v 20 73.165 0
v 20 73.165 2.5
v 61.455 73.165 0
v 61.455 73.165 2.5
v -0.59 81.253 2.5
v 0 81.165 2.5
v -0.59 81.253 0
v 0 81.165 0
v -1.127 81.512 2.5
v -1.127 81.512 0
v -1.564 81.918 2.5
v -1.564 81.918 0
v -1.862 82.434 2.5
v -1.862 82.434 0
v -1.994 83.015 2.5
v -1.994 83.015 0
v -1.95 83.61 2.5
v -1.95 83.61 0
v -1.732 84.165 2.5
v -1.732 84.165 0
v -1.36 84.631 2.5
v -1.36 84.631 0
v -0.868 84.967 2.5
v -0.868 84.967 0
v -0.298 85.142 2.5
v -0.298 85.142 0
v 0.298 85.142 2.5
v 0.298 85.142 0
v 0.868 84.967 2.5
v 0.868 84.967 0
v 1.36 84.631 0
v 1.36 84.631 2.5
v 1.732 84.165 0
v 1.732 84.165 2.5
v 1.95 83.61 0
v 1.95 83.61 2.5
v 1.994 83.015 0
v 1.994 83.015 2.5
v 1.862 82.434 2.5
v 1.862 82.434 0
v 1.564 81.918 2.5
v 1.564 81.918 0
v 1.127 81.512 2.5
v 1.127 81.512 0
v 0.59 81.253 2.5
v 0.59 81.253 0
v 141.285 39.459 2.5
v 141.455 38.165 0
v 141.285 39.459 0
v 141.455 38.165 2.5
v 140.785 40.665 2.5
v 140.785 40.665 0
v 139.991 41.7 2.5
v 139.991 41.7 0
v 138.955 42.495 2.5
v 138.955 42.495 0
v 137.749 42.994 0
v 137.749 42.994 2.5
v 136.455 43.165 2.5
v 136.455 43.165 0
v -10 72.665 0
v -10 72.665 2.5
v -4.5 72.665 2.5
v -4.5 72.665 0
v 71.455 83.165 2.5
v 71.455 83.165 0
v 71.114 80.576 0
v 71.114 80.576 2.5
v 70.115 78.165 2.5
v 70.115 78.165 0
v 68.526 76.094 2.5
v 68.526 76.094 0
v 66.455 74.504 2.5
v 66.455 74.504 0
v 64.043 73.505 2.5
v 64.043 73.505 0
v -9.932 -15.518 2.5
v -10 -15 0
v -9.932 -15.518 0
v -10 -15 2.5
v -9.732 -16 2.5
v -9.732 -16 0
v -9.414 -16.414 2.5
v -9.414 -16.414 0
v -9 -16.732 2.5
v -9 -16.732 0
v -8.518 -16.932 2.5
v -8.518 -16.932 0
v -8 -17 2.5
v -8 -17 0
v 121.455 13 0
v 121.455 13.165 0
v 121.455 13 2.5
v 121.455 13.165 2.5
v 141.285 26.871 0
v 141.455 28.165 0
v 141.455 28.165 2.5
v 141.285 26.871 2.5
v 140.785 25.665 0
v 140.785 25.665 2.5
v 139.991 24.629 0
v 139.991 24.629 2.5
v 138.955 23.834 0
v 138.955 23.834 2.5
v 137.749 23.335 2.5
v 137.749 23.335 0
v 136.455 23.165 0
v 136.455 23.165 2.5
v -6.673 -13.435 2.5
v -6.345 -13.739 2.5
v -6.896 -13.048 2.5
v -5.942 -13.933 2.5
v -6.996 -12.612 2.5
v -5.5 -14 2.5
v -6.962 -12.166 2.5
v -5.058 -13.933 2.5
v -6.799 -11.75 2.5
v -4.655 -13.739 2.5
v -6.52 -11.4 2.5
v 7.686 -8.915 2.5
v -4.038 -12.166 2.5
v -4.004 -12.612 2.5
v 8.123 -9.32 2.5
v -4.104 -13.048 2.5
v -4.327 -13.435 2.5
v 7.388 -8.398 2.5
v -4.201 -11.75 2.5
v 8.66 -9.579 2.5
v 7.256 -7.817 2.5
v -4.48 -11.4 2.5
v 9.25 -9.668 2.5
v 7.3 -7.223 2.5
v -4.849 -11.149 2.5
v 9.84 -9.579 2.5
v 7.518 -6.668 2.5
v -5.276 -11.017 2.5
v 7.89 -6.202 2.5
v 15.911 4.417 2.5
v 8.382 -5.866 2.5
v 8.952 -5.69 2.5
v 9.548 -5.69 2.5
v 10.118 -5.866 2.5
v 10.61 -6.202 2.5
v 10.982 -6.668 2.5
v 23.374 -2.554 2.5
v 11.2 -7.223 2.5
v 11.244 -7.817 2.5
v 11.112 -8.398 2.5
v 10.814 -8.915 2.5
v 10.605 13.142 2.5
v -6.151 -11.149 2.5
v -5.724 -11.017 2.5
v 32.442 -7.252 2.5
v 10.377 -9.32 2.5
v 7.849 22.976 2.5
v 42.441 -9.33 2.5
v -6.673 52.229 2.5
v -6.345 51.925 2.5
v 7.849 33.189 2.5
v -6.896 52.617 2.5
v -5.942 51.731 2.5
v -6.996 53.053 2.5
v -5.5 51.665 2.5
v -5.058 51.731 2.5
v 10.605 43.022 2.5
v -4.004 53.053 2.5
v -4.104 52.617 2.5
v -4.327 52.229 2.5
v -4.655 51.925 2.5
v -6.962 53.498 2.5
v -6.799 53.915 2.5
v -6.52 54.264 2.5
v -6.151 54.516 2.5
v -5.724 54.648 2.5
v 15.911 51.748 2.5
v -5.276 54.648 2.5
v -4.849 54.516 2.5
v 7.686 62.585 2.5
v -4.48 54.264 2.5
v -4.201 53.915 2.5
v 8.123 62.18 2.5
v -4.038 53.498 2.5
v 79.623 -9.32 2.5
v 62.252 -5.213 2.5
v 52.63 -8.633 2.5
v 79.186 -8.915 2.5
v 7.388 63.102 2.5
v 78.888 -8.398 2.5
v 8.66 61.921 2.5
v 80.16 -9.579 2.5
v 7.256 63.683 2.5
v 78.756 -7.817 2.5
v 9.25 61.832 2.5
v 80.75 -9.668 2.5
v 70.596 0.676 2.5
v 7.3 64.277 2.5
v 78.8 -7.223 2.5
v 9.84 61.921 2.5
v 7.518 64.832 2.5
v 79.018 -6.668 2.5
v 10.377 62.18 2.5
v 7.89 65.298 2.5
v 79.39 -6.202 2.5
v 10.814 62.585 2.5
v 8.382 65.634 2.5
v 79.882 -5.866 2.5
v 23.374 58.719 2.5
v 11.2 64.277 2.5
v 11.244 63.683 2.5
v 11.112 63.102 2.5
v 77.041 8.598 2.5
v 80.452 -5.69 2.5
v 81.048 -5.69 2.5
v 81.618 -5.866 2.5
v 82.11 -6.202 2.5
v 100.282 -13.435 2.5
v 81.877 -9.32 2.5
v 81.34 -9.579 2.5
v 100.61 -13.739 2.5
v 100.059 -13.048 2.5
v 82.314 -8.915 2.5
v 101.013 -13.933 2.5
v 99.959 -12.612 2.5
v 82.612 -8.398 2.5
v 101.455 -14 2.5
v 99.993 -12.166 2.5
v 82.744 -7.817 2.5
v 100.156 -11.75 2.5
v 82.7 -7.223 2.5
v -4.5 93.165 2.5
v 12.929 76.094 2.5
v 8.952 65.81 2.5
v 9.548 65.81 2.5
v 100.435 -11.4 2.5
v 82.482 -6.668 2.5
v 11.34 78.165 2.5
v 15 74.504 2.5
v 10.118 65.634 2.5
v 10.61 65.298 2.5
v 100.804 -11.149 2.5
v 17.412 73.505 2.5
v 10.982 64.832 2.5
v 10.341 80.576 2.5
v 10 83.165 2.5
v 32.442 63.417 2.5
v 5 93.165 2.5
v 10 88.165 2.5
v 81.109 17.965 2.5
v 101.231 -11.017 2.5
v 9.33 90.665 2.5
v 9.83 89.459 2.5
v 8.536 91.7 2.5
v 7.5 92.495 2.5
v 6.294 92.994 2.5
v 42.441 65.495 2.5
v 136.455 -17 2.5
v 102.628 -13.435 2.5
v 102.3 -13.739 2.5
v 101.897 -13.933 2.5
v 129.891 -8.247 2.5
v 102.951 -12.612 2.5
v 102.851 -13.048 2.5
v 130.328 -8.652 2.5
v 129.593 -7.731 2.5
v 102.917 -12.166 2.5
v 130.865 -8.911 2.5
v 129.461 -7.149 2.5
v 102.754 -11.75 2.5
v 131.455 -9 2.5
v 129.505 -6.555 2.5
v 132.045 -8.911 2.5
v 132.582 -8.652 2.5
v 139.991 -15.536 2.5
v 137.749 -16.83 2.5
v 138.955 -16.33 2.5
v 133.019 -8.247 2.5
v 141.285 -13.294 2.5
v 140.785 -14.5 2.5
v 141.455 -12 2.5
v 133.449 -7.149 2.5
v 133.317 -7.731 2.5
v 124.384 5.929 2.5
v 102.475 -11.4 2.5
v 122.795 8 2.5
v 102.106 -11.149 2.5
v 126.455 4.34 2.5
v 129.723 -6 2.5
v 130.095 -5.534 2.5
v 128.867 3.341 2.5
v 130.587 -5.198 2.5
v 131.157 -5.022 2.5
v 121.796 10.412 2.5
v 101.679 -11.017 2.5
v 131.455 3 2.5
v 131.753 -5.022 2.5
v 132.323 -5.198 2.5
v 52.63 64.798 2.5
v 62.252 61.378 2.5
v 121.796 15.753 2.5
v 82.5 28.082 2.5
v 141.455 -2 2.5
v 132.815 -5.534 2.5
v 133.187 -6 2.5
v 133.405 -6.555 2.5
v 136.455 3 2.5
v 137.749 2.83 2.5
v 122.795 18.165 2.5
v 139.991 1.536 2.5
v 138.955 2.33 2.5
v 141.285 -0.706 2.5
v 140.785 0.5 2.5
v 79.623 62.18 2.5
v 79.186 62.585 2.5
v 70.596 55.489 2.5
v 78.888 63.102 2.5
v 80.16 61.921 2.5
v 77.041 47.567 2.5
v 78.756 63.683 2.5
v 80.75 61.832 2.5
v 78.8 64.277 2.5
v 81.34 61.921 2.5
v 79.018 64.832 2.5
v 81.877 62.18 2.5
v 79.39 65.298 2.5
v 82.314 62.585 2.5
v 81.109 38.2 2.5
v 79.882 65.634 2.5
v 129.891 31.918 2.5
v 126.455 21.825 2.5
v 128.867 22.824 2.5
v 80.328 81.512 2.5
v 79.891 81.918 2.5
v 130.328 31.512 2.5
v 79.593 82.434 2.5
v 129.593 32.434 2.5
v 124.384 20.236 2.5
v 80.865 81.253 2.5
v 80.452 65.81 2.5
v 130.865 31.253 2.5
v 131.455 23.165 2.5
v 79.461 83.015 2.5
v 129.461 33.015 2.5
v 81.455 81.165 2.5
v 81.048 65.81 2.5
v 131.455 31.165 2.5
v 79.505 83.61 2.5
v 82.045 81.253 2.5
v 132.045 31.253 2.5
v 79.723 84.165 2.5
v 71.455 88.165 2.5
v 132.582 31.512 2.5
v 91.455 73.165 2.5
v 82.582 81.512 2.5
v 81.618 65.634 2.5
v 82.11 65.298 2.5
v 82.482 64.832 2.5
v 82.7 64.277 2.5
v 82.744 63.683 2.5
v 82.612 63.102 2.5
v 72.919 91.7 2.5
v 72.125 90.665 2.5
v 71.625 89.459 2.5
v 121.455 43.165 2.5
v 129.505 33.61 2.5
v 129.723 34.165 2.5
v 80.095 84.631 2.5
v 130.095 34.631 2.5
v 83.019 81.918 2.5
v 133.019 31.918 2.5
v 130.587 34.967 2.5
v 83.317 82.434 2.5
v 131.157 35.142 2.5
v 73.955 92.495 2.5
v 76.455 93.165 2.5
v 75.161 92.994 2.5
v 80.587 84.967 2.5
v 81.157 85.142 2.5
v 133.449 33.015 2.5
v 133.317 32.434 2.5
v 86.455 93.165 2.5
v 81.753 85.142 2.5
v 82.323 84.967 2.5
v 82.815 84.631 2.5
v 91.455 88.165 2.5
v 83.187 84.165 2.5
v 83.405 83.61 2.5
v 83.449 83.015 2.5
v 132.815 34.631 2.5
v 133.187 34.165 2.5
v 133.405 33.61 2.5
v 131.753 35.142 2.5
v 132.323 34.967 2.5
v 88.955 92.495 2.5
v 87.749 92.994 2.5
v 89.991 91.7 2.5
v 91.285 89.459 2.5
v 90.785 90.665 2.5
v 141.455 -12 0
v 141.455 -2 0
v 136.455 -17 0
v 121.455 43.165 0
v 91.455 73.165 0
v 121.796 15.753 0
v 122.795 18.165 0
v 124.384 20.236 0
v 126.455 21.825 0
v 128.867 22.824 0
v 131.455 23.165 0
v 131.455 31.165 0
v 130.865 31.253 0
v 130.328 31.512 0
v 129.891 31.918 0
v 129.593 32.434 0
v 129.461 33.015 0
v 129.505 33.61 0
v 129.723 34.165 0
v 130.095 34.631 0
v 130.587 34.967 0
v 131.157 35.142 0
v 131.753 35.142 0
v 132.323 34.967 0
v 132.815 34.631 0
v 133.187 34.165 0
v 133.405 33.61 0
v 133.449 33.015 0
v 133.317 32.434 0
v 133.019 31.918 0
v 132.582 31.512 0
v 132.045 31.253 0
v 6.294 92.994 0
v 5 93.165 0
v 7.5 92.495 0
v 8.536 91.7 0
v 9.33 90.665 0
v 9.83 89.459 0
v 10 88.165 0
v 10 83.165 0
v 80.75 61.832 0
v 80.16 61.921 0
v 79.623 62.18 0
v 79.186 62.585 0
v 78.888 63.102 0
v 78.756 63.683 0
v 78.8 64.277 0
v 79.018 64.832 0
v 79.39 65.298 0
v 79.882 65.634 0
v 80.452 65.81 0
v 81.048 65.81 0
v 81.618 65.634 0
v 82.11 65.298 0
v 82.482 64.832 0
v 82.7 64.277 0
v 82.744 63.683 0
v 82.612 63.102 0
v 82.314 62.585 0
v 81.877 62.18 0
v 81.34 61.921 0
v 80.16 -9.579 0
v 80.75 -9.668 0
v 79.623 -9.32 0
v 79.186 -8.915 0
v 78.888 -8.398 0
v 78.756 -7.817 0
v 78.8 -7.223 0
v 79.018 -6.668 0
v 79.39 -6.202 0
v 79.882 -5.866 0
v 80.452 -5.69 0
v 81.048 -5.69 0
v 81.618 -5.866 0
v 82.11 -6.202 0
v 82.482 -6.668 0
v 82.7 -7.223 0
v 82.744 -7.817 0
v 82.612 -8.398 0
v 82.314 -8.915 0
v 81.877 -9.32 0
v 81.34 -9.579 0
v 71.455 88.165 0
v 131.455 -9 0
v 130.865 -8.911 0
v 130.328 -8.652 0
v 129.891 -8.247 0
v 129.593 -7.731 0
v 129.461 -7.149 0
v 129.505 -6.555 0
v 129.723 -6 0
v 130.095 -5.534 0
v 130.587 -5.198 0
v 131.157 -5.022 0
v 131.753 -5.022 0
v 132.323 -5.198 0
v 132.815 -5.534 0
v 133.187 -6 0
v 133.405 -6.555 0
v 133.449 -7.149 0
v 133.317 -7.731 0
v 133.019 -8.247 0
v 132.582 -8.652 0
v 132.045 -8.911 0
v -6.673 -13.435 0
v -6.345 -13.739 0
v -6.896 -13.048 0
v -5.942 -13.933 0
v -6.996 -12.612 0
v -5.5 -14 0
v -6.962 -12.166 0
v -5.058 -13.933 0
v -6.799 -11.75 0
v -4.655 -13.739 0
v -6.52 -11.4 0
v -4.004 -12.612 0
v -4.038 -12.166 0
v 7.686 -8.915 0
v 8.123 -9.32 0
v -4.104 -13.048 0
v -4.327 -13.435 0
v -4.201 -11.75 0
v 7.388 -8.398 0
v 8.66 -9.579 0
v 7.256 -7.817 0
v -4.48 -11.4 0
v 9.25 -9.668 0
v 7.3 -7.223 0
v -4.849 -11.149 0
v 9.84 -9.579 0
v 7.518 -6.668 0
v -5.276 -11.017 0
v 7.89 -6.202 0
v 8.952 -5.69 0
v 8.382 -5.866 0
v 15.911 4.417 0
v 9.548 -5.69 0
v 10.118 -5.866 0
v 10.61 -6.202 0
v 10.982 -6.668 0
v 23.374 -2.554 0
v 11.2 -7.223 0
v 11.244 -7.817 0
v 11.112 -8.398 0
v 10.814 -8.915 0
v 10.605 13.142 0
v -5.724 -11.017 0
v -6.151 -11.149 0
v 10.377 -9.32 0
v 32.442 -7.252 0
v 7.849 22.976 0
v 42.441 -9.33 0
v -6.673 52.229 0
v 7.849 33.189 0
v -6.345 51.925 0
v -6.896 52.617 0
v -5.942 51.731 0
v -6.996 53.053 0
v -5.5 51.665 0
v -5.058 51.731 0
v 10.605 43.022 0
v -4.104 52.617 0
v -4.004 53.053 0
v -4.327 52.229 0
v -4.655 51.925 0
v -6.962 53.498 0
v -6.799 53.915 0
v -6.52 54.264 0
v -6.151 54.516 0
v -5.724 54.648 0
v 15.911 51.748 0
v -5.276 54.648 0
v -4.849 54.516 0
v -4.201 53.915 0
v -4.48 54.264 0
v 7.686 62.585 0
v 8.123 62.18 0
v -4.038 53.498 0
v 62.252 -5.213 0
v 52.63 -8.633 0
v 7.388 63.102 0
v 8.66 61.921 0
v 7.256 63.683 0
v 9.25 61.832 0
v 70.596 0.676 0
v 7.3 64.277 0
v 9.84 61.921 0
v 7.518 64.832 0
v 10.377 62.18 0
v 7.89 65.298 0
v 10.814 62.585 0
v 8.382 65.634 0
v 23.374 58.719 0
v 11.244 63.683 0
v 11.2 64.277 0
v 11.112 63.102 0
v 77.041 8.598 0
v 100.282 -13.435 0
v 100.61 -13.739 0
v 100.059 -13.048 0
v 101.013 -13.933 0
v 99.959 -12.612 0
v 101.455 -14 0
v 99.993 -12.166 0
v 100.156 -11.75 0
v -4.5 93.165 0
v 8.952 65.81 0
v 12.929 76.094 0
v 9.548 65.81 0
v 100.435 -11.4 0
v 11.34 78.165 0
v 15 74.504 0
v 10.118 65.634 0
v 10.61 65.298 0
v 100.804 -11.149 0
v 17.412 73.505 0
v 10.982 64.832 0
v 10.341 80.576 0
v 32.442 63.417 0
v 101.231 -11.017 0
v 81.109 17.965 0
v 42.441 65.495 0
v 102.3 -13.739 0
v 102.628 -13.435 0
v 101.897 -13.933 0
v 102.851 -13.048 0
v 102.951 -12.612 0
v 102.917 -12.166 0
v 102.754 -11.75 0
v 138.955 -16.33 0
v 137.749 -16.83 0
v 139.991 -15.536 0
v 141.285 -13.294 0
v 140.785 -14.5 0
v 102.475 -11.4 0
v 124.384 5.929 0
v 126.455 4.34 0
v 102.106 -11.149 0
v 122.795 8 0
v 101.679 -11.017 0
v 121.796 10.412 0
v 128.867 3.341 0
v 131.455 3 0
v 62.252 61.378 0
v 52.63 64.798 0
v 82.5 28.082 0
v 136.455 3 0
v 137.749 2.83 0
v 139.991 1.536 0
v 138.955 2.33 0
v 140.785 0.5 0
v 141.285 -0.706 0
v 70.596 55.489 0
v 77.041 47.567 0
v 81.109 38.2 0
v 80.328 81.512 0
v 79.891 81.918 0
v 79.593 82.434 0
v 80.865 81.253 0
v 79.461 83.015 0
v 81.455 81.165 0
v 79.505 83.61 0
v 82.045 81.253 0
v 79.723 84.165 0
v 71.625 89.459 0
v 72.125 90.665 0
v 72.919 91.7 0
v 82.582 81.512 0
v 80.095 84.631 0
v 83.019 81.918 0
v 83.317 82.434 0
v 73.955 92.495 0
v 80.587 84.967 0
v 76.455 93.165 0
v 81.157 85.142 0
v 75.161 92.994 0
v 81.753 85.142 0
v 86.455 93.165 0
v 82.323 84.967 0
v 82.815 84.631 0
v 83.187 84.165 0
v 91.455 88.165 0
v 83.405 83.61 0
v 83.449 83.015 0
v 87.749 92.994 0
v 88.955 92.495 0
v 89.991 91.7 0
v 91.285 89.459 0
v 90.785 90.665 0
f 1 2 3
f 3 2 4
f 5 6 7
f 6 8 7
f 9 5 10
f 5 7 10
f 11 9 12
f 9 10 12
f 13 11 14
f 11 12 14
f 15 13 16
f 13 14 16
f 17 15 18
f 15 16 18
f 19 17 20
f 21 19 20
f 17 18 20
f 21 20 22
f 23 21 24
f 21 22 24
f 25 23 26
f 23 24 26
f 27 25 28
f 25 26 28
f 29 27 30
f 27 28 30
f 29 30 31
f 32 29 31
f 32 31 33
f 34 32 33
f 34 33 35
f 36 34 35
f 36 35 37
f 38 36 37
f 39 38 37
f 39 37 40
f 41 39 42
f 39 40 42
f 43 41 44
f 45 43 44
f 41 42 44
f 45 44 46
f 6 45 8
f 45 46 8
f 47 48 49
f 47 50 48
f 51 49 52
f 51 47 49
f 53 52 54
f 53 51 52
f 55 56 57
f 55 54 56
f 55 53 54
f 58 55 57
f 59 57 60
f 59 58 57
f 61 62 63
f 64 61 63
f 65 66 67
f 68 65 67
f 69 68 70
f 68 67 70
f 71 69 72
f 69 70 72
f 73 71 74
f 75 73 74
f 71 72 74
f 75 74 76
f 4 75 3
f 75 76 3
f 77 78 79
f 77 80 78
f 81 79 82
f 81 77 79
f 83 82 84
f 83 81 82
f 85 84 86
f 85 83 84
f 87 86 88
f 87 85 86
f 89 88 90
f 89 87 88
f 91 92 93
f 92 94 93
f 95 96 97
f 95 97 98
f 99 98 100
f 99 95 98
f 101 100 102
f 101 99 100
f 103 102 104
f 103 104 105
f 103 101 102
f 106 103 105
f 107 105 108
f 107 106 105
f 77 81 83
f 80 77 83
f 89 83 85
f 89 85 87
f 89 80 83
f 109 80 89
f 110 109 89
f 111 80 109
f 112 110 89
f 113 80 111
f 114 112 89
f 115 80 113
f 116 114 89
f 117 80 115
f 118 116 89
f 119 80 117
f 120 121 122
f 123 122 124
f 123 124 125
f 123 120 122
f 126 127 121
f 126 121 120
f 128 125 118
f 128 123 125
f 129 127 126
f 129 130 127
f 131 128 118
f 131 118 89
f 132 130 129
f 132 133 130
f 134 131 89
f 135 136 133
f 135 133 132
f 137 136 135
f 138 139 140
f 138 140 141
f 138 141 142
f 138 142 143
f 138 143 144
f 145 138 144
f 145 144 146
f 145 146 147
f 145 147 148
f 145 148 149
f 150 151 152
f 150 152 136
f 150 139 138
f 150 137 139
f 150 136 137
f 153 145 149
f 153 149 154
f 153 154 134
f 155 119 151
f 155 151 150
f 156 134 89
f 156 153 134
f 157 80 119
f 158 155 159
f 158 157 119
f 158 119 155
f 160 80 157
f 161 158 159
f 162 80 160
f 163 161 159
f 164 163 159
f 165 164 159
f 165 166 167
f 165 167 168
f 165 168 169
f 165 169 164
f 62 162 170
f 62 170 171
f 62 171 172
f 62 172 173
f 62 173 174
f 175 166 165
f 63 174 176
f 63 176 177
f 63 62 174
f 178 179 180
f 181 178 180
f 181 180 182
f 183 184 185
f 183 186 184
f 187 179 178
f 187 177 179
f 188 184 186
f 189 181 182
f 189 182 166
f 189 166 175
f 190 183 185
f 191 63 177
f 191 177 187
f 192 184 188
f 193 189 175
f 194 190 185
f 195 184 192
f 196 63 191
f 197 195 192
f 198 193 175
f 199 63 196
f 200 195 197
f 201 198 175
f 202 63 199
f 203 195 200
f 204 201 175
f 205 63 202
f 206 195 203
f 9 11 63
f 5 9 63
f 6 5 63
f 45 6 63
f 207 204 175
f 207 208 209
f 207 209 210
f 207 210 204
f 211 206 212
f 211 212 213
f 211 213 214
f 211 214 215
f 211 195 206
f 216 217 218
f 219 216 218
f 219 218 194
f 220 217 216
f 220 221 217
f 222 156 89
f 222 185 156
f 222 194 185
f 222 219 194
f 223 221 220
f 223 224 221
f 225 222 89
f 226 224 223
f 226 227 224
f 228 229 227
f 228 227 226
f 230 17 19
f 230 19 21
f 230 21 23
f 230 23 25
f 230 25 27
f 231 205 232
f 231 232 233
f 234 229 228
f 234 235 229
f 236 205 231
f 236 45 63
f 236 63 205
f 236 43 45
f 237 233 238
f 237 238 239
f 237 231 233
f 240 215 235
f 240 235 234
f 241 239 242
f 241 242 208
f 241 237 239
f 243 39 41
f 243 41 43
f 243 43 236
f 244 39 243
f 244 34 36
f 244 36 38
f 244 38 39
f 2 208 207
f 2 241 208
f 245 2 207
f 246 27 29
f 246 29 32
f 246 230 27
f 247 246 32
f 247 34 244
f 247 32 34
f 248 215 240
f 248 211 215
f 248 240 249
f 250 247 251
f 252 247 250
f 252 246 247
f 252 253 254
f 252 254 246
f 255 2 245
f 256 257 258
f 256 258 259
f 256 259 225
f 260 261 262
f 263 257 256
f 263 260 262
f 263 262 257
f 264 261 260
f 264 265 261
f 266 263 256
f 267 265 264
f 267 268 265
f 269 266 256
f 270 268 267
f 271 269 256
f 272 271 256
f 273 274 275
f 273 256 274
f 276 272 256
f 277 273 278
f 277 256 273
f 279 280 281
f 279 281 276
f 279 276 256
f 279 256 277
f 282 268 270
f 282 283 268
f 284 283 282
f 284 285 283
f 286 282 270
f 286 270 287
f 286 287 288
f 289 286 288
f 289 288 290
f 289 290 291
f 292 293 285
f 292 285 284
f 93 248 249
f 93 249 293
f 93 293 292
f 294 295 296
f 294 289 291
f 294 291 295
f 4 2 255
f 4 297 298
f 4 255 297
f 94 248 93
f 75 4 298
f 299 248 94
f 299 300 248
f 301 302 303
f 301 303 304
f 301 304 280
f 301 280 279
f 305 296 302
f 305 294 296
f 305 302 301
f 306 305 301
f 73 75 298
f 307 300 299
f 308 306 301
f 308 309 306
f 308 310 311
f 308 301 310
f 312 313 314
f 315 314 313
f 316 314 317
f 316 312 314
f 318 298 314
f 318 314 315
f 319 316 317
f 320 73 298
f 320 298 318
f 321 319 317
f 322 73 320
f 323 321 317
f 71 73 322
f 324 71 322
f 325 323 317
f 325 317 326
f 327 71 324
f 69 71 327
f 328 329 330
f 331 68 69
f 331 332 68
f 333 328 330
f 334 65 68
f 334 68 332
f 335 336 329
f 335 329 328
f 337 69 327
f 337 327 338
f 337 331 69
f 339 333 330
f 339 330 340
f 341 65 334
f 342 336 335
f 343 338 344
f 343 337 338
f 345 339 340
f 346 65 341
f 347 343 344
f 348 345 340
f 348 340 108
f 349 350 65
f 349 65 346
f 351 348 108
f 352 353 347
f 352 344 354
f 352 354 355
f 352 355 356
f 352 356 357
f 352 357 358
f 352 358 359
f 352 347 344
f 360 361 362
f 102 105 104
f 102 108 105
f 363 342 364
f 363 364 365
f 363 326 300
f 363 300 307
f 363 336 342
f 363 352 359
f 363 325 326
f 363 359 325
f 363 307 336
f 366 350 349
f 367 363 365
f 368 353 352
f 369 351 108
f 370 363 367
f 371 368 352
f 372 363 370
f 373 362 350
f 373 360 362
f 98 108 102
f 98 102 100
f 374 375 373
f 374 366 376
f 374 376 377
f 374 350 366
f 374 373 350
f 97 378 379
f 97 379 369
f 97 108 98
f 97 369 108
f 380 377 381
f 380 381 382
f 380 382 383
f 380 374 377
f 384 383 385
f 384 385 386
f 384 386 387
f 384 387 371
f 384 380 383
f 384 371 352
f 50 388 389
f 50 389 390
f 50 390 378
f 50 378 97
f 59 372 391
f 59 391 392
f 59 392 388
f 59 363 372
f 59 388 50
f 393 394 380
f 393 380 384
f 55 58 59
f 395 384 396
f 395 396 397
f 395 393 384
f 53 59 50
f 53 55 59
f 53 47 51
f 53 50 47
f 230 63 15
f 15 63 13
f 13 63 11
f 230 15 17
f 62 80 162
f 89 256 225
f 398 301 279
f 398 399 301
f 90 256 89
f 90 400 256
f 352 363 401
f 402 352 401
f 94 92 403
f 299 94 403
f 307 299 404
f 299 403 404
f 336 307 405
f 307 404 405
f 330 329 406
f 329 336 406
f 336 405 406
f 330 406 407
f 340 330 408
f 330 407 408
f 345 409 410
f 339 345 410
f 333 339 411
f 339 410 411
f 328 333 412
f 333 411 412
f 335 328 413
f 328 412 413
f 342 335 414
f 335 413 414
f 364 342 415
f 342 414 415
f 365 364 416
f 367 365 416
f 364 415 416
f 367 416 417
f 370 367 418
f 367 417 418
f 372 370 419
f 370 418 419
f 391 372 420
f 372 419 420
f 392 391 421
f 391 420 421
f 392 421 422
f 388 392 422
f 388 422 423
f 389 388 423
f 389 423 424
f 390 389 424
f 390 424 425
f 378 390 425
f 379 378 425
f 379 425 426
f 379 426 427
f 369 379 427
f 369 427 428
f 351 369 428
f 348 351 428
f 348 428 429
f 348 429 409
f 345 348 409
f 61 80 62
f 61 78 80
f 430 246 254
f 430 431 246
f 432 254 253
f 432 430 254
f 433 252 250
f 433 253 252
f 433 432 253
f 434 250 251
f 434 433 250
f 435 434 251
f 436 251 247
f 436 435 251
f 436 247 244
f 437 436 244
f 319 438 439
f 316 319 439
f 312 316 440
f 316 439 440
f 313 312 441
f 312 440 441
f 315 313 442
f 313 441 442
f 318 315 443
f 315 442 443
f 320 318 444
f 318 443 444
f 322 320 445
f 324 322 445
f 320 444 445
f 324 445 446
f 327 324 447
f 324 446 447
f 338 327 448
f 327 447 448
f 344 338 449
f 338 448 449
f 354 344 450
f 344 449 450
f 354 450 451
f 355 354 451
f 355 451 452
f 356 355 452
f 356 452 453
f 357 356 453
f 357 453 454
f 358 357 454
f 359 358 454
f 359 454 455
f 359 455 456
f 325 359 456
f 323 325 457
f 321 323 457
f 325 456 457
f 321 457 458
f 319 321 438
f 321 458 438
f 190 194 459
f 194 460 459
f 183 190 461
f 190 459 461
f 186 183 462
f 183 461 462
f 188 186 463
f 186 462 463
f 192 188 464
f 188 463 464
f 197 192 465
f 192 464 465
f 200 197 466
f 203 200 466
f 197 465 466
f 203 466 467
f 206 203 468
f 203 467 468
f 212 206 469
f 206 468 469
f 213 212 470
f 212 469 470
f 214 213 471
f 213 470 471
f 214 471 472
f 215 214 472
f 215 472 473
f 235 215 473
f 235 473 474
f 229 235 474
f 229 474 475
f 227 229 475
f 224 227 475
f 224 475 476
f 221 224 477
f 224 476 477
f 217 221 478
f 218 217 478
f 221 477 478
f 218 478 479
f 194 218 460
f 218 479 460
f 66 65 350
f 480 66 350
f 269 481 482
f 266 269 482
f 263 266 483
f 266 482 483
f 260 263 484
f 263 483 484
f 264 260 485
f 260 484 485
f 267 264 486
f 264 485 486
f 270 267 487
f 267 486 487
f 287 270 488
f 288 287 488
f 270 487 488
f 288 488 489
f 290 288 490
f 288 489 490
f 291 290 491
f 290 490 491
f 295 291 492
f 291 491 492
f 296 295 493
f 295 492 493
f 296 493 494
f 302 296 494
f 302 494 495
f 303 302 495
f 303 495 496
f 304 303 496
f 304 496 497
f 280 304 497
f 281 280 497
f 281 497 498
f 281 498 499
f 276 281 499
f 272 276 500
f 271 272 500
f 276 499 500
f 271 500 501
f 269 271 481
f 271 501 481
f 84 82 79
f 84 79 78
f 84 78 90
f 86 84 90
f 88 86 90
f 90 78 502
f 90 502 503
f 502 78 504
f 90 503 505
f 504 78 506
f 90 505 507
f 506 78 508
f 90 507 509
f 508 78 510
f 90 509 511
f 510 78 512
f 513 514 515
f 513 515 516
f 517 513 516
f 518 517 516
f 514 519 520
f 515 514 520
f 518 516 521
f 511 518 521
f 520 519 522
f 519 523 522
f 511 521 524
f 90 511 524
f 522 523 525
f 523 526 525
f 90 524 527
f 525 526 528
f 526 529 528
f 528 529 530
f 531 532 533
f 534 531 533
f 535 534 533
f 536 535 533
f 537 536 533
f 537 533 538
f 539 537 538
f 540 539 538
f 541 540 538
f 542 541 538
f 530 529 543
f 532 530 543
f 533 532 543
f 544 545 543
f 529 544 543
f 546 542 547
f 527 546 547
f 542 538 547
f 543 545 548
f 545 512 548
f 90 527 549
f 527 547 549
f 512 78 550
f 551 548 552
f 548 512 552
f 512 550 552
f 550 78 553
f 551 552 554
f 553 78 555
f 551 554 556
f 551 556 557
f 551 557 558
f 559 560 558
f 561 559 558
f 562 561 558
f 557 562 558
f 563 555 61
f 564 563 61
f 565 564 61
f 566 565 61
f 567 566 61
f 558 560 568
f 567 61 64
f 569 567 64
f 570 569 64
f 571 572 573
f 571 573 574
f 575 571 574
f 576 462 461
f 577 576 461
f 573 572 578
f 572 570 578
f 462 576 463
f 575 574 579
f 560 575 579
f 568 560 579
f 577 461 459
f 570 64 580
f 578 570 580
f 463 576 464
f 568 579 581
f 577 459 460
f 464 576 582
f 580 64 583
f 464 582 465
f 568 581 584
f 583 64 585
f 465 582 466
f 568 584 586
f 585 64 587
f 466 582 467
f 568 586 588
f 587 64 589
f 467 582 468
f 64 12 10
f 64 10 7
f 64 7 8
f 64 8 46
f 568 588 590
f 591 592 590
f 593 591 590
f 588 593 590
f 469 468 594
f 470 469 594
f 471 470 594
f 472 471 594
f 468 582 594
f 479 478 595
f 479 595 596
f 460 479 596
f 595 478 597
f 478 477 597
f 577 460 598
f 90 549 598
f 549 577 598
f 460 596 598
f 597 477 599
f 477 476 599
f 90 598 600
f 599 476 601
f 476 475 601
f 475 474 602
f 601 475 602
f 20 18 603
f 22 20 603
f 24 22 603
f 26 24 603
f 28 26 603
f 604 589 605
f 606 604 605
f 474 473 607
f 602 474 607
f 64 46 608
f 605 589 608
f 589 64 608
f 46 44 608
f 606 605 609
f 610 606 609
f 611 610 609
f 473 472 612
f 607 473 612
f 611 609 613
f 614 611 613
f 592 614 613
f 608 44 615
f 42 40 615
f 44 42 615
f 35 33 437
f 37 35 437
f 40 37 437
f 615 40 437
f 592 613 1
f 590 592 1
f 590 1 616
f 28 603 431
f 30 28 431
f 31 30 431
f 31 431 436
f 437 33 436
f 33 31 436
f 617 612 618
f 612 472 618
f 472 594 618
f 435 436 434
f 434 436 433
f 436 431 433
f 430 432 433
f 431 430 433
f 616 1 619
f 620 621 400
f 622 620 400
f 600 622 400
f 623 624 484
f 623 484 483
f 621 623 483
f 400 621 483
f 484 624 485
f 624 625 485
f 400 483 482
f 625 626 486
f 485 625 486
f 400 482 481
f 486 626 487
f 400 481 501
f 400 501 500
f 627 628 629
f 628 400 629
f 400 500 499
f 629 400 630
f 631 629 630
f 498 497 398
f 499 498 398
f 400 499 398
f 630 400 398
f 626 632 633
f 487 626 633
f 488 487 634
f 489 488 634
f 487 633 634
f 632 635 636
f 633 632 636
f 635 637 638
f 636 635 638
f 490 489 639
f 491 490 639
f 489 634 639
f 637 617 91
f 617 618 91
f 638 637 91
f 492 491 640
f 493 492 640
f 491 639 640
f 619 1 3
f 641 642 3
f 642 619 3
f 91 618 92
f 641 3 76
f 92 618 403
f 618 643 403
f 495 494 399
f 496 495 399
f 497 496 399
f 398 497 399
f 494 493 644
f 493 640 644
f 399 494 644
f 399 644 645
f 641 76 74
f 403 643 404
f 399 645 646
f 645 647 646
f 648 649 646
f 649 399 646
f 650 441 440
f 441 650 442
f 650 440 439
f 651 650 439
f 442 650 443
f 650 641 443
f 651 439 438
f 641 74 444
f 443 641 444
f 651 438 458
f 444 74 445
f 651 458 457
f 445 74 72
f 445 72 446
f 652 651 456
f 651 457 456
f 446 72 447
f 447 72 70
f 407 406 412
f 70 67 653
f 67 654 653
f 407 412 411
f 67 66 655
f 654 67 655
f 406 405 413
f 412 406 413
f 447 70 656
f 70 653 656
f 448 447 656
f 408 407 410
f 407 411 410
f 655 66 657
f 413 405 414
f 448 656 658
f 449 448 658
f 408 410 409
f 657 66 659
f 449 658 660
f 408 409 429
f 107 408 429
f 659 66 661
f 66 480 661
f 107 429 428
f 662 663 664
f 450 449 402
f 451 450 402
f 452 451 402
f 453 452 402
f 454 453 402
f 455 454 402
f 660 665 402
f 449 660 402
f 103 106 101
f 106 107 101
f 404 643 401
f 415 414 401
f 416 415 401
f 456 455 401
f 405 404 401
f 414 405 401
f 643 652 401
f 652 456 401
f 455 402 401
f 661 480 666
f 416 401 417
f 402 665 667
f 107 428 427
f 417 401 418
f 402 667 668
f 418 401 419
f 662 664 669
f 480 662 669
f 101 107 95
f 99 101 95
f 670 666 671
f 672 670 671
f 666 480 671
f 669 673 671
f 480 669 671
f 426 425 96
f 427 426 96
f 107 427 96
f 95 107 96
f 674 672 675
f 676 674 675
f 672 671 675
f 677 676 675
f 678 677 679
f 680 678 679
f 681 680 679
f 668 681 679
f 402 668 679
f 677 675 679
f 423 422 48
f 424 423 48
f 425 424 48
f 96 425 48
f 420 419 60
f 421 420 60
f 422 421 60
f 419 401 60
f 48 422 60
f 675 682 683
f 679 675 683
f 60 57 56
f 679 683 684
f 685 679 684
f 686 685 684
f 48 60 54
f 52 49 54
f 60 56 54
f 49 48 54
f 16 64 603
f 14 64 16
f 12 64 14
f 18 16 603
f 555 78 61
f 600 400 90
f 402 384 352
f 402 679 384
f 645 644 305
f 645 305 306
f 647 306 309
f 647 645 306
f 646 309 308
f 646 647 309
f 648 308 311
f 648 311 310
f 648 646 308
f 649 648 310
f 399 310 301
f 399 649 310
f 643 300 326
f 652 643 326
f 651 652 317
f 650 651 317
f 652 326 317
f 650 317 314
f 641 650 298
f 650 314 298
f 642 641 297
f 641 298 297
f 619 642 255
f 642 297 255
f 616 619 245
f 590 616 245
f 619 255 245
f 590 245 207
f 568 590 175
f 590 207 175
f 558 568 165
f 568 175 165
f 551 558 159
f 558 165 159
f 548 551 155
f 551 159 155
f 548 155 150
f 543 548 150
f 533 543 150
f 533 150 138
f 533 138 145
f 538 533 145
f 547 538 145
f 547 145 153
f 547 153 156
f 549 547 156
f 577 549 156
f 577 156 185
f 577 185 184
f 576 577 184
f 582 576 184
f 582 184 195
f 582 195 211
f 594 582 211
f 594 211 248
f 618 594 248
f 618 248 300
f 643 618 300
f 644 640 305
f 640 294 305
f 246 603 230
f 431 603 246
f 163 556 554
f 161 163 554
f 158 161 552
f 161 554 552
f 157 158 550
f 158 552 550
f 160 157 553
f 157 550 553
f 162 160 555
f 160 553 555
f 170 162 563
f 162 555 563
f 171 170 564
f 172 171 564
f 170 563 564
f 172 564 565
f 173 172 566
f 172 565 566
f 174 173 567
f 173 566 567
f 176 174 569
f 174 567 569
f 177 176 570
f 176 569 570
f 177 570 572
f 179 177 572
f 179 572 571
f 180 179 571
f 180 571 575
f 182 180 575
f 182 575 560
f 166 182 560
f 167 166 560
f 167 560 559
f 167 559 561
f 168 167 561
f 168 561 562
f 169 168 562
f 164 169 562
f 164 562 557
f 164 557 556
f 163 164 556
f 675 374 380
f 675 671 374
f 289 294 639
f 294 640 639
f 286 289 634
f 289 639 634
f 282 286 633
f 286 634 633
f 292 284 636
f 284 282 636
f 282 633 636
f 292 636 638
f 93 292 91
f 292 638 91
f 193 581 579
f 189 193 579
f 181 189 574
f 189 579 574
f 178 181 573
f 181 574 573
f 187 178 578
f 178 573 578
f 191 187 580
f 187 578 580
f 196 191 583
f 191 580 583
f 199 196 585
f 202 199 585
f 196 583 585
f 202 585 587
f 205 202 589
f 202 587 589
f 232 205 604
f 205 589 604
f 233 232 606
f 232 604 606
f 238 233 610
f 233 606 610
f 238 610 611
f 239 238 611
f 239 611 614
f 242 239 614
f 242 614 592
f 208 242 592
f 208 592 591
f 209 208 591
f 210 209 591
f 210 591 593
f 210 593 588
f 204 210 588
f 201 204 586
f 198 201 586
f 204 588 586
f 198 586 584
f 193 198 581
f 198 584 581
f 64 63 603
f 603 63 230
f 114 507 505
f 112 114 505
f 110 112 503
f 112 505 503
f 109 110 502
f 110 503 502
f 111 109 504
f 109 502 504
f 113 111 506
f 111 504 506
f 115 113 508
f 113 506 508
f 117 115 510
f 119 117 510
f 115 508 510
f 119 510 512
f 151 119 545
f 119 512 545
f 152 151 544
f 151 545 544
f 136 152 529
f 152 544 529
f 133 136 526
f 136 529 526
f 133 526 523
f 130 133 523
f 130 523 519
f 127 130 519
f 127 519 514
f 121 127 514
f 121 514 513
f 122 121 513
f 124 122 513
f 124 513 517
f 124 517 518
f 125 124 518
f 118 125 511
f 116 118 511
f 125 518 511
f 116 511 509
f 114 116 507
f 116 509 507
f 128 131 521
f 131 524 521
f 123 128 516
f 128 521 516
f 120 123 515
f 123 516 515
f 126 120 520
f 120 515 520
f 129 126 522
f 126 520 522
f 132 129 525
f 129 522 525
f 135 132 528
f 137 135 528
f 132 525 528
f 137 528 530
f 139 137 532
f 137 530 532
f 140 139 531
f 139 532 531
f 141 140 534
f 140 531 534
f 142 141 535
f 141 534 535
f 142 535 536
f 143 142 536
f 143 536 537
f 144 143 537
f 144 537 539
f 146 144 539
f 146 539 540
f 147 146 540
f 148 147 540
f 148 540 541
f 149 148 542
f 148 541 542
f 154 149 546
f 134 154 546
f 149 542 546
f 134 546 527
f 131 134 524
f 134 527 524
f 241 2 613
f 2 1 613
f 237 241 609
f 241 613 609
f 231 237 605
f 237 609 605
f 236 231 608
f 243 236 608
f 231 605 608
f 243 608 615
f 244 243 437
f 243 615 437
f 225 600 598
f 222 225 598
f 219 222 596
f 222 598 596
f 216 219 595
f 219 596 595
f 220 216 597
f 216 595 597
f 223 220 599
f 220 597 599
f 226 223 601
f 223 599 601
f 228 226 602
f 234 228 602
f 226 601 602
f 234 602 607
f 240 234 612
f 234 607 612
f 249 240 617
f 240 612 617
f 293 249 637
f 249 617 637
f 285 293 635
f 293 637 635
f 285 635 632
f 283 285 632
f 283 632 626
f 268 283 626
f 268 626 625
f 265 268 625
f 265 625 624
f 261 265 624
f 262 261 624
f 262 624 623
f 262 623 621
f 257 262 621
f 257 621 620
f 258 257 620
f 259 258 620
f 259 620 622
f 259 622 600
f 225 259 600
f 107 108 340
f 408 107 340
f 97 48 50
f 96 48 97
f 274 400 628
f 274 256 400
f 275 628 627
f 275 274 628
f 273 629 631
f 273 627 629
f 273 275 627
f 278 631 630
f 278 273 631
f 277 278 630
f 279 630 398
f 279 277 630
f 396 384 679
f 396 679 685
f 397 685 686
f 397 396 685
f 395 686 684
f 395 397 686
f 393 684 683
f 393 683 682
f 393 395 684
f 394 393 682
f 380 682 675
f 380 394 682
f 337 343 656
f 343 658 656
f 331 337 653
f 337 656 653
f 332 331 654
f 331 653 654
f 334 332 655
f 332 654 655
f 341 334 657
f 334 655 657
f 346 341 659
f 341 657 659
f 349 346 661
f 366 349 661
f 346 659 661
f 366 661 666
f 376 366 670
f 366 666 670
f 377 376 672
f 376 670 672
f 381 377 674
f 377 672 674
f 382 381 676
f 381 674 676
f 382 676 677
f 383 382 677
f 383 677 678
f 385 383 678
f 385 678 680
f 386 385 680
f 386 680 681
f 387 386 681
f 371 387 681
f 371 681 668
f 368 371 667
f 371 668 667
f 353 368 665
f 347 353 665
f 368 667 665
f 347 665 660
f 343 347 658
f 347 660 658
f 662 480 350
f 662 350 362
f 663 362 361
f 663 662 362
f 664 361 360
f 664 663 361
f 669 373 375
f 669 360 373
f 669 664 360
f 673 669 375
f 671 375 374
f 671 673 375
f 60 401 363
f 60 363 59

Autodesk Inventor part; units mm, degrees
ref_plane "YZ Plane" through (0, 0, 0) normal (1, 0, 0) x (0, 1, 0)
ref_plane "XZ Plane" through (0, 0, 0) normal (0, 1, 0) x (-1, 0, 0)
ref_plane "XY Plane" through (0, 0, 0) normal (0, 0, 1) x (1, 0, 0)
sketch "Szkic1" plane through (0, 0, 0) normal (0, 0, 1) x (1, 0, 0)
  line L0 (0, 53.1646) -> (0, 0)
  line L1 (0, 0) -> (98.9175, 0)
  line L2 (98.9175, 0) -> (98.9175, 1.2597)
  line L3 (98.9175, 1.2597) -> (101.455, 3.8466)
  line L4 (101.455, 3.8466) -> (101.455, 38.0126)
  line L5 (101.455, 38.0126) -> (98.9175, 40.5017)
  line L6 (98.9175, 40.5017) -> (98.9175, 50.7051)
  line L7 (98.9175, 50.7051) -> (96.4101, 53.1646)
  line L8 (96.4101, 53.1646) -> (0, 53.1646)
  line L9 (-10, 93.1646) -> (141.455, 93.1646)
  line L10 (141.455, 93.1646) -> (141.455, -17)
  line L11 (141.455, -17) -> (-10, -17)
  line L12 (-10, -17) -> (-10, 93.1646)
  line L13 (91.455, 93.1646) -> (91.455, 43.1646)
  line L14 (91.455, 43.1646) -> (141.455, 43.1646)
  point P0 (-10, 13.9306)
  point P1 (7.9866, -17)
  dimension "d0" = 101.455
  dimension "d1" = 53.1646
  dimension "d2" = 98.9175
  dimension "d21" = 98.9175
  dimension "d22" = 1.2597
  dimension "d23" = 10.2034
  dimension "d24" = 34.166
  dimension "d33" = 40
  dimension "d34" = 40
  dimension "d35" = 17
  dimension "d36" = 10
  dimension "d37" = 50
  dimension "d38" = 50
extrude "Wyciągnięcie proste1" add sketch "Szkic1" along normal blind 2.5 contours L8 L13 L14 L6 L5 L4 L3 L2 L1 L0 | L0 L1 L2 L3 L4 L5 L6 L14 L10 L11 L12 L9 L13 L8
sketch "Szkic2" plane through (0, 0, 2.5) normal (0, 0, 1) x (1, 0, 0)
  line L0 (-10, 93.1646) -> (-10, -17) projected
  line L1 (-10, -17) -> (141.455, -17) projected
  line L2 (141.455, -17) -> (141.455, 43.1646) projected
  line L3 (141.455, 43.1646) -> (91.455, 43.1646) projected
  line L4 (91.455, 43.1646) -> (91.455, 93.1646) projected
  line L5 (91.455, 93.1646) -> (-10, 93.1646) projected
  line L6 (10, 93.1646) -> (10, 73.1646)
  line L7 (10, 73.1646) -> (71.455, 73.1646)
  line L8 (71.455, 73.1646) -> (71.455, 93.1646)
  line L9 (91.455, 93.1646) -> (-10, 93.1646) projected
  line L10 (141.455, -17) -> (141.455, 43.1646) projected
  line L11 (141.455, 23.1646) -> (121.455, 23.1646)
  line L12 (121.455, 23.1646) -> (121.455, 3)
  line L13 (121.455, 3) -> (141.455, 3)
  circle A0 centre (45, 28.0823) radius 37.5
  point P0 (0, 0)
  point P1 (131.455, -7)
  point P2 (131.455, 33.1646)
  point P3 (81.455, 83.1646)
  point P4 (0, 83.1646)
  point P5 (9.25, 63.8323)
  point P6 (80.75, 63.8323)
  point P7 (80.75, -7.6677)
  point P8 (9.25, -7.6677)
  dimension "d42" = 20
  dimension "d43" = 20
  dimension "d44" = 20
  dimension "d45" = 20
  dimension "d46" = 20
  dimension "d47" = 20
  dimension "d78" = 10
  dimension "d79" = 10
  dimension "d80" = 10
  dimension "d81" = 10
  dimension "d82" = 10
  dimension "d83" = 10
  dimension "d84" = 10
  dimension "d85" = 10
  dimension "d121" = 75
  dimension "d122" = 35.75
  dimension "d123" = 35.75
  dimension "d124" = 35.75
  dimension "d125" = 35.75
  dimension "d126" = 35.75
  dimension "d127" = 35.75
  dimension "d128" = 35.75
  dimension "d129" = 35.75
  dimension "d139" = 45.0823
  dimension "d140" = 101.455
  dimension "d141" = 90.1646
  dimension "d142" = 55
fillet "Zaokrąglenie1" radius 5 4 edges at (-10, 93.1646, 1.25) (91.455, 93.1646, 1.25) (141.455, 43.1646, 1.25) (141.455, -17, 1.25)
hole "Otwór1" at (131.455, -7, 2.5) at (131.455, 33.1646, 2.5) at (81.455, 83.1646, 2.5) at (0, 83.1646, 2.5) direction (0, 0, -1) diameter 4 end through all
fillet "Zaokrąglenie2" radius 2 1 edges at (-10, -17, 1.25)
sketch "Szkic4" plane through (0, 0, 2.5) normal (0, 0, 1) x (1, 0, 0)
  arc A0 (-10, -15) -> (-8, -17) centre (-8, -15) ccw projected
  line L0 (-8, -17) -> (136.455, -17) projected
  arc A1 (136.455, -17) -> (141.455, -12) centre (136.455, -12) ccw projected
  line L1 (141.455, -12) -> (141.455, 38.1646) projected
  arc A2 (141.455, 38.1646) -> (136.455, 43.1646) centre (136.455, 38.1646) ccw projected
  line L2 (136.455, 43.1646) -> (91.455, 43.1646) projected
  line L3 (91.455, 43.1646) -> (91.455, 88.1646) projected
  arc A3 (91.455, 88.1646) -> (86.455, 93.1646) centre (86.455, 88.1646) ccw projected
  line L4 (86.455, 93.1646) -> (-5, 93.1646) projected
  arc A4 (-5, 93.1646) -> (-10, 88.1646) centre (-5, 88.1646) ccw projected
  line L5 (-10, 88.1646) -> (-10, -15) projected
  circle A5 centre (81.455, 83.1646) radius 2 projected
  circle A6 centre (131.455, -7) radius 2 projected
  circle A7 centre (131.455, 33.1646) radius 2 projected
  circle A8 centre (0, 83.1646) radius 2 projected
  point P0 (0, 0)
  point P1 (-5.5, 53.1646)
  point P2 (-5.5, -12.5)
  point P3 (101.455, -12.5)
  dimension "d106" = 40
  dimension "d107" = 4.5
  dimension "d108" = 4.5
  dimension "d109" = 4.5
  dimension "d110" = 4.5
hole "Otwór2" at (-5.5, 53.1646, 2.5) at (-5.5, -12.5, 2.5) at (101.455, -12.5, 2.5) direction (0, 0, -1) diameter 3 end through all
chamfer "Faza2" distance 30 angle 45 1 edges at (91.455, 43.1646, 1.25)
extrude "Wyciągnięcie proste4" cut sketch "Szkic2" against normal through all contours L5 L8 L7 L6 | L13 L12 L11 L2 | A0
hole "Otwór3" at (9.25, 63.8323, 2.5) at (80.75, 63.8323, 2.5) at (80.75, -7.6677, 2.5) at (9.25, -7.6677, 2.5) direction (0, 0, -1) diameter 4 end through all
fillet "Zaokrąglenie3" radius 10 4 edges at (71.455, 73.1646, 1.25) (10, 73.1646, 1.25) (121.455, 23.1646, 1.25) (121.455, 3, 1.25)
fillet "Zaokrąglenie3" radius 5 4 edges at (141.455, 23.1646, 1.25) (141.455, 3, 1.25) (71.455, 93.1646, 1.25) (10, 93.1646, 1.25)
sketch "Szkic7" plane through (0, 0, 2.5) normal (0, 0, 1) x (1, 0, 0)
  arc A0 (10, 88.1646) -> (5, 93.1646) centre (5, 88.1646) ccw projected
  line L0 (5, 93.1646) -> (-5, 93.1646) projected
  arc A1 (-5, 93.1646) -> (-10, 88.1646) centre (-5, 88.1646) ccw projected
  line L1 (-10, 88.1646) -> (-10, -15) projected
  arc A2 (-10, -15) -> (-8, -17) centre (-8, -15) ccw projected
  line L2 (-8, -17) -> (136.455, -17) projected
  arc A3 (136.455, -17) -> (141.455, -12) centre (136.455, -12) ccw projected
  line L3 (141.455, -12) -> (141.455, -2) projected
  arc A4 (141.455, -2) -> (136.455, 3) centre (136.455, -2) ccw projected
  line L4 (136.455, 3) -> (131.455, 3) projected
  arc A5 (121.455, 13) -> (131.455, 3) centre (131.455, 13) ccw projected
  line L5 (121.455, 13) -> (121.455, 13.1646) projected
  arc A6 (131.455, 23.1646) -> (121.455, 13.1646) centre (131.455, 13.1646) ccw projected
  line L6 (131.455, 23.1646) -> (136.455, 23.1646) projected
  arc A7 (136.455, 23.1646) -> (141.455, 28.1646) centre (136.455, 28.1646) ccw projected
  line L7 (141.455, 28.1646) -> (141.455, 38.1646) projected
  arc A8 (141.455, 38.1646) -> (136.455, 43.1646) centre (136.455, 38.1646) ccw projected
  line L8 (136.455, 43.1646) -> (121.455, 43.1646) projected
  line L9 (91.455, 73.1646) -> (121.455, 43.1646) projected
  line L10 (91.455, 73.1646) -> (91.455, 88.1646) projected
  arc A9 (91.455, 88.1646) -> (86.455, 93.1646) centre (86.455, 88.1646) ccw projected
  line L11 (86.455, 93.1646) -> (76.455, 93.1646) projected
  arc A10 (76.455, 93.1646) -> (71.455, 88.1646) centre (76.455, 88.1646) ccw projected
  line L12 (71.455, 88.1646) -> (71.455, 83.1646) projected
  arc A11 (61.455, 73.1646) -> (71.455, 83.1646) centre (61.455, 83.1646) ccw projected
  line L13 (61.455, 73.1646) -> (20, 73.1646) projected
  arc A12 (10, 83.1646) -> (20, 73.1646) centre (20, 83.1646) ccw projected
  line L14 (10, 83.1646) -> (10, 88.1646) projected
  circle A13 centre (80.75, -7.6677) radius 2 projected
  circle A14 centre (9.25, 63.8323) radius 2 projected
  circle A15 centre (80.75, 63.8323) radius 2 projected
  circle A16 centre (9.25, -7.6677) radius 2 projected
  circle A17 centre (45, 28.0823) radius 37.5 projected
  circle A18 centre (-5.5, -12.5) radius 1.5 projected
  circle A19 centre (-5.5, 53.1646) radius 1.5 projected
  circle A20 centre (101.455, -12.5) radius 1.5 projected
  circle A21 centre (0, 83.1646) radius 2 projected
  circle A22 centre (131.455, 33.1646) radius 2 projected
  circle A23 centre (131.455, -7) radius 2 projected
  circle A24 centre (81.455, 83.1646) radius 2 projected
  line L15 (-10, 72.6646) -> (-4.5, 72.6646)
  arc A25 (-5, 93.1646) -> (-10, 88.1646) centre (-5, 88.1646) ccw projected
  line L16 (-4.5, 72.6646) -> (-4.5, 93.1646)
  point P0 (0, 0)
  dimension "d145" = 5.5
  dimension "d147" = 20.5
extrude "Wyciągnięcie proste5" cut sketch "Szkic7" against normal through all contours L16 L15 L1 A1 L0
equation "\"d47\" = d46"
equation "\"d106\" = d105"
equation "\"d107\" = d110"
equation "\"d108\" = d110"
equation "\"d109\" = d110"
equation "\"d105\" = 40"
properties part number "3DP_PLA_Controller_Case_Top"
